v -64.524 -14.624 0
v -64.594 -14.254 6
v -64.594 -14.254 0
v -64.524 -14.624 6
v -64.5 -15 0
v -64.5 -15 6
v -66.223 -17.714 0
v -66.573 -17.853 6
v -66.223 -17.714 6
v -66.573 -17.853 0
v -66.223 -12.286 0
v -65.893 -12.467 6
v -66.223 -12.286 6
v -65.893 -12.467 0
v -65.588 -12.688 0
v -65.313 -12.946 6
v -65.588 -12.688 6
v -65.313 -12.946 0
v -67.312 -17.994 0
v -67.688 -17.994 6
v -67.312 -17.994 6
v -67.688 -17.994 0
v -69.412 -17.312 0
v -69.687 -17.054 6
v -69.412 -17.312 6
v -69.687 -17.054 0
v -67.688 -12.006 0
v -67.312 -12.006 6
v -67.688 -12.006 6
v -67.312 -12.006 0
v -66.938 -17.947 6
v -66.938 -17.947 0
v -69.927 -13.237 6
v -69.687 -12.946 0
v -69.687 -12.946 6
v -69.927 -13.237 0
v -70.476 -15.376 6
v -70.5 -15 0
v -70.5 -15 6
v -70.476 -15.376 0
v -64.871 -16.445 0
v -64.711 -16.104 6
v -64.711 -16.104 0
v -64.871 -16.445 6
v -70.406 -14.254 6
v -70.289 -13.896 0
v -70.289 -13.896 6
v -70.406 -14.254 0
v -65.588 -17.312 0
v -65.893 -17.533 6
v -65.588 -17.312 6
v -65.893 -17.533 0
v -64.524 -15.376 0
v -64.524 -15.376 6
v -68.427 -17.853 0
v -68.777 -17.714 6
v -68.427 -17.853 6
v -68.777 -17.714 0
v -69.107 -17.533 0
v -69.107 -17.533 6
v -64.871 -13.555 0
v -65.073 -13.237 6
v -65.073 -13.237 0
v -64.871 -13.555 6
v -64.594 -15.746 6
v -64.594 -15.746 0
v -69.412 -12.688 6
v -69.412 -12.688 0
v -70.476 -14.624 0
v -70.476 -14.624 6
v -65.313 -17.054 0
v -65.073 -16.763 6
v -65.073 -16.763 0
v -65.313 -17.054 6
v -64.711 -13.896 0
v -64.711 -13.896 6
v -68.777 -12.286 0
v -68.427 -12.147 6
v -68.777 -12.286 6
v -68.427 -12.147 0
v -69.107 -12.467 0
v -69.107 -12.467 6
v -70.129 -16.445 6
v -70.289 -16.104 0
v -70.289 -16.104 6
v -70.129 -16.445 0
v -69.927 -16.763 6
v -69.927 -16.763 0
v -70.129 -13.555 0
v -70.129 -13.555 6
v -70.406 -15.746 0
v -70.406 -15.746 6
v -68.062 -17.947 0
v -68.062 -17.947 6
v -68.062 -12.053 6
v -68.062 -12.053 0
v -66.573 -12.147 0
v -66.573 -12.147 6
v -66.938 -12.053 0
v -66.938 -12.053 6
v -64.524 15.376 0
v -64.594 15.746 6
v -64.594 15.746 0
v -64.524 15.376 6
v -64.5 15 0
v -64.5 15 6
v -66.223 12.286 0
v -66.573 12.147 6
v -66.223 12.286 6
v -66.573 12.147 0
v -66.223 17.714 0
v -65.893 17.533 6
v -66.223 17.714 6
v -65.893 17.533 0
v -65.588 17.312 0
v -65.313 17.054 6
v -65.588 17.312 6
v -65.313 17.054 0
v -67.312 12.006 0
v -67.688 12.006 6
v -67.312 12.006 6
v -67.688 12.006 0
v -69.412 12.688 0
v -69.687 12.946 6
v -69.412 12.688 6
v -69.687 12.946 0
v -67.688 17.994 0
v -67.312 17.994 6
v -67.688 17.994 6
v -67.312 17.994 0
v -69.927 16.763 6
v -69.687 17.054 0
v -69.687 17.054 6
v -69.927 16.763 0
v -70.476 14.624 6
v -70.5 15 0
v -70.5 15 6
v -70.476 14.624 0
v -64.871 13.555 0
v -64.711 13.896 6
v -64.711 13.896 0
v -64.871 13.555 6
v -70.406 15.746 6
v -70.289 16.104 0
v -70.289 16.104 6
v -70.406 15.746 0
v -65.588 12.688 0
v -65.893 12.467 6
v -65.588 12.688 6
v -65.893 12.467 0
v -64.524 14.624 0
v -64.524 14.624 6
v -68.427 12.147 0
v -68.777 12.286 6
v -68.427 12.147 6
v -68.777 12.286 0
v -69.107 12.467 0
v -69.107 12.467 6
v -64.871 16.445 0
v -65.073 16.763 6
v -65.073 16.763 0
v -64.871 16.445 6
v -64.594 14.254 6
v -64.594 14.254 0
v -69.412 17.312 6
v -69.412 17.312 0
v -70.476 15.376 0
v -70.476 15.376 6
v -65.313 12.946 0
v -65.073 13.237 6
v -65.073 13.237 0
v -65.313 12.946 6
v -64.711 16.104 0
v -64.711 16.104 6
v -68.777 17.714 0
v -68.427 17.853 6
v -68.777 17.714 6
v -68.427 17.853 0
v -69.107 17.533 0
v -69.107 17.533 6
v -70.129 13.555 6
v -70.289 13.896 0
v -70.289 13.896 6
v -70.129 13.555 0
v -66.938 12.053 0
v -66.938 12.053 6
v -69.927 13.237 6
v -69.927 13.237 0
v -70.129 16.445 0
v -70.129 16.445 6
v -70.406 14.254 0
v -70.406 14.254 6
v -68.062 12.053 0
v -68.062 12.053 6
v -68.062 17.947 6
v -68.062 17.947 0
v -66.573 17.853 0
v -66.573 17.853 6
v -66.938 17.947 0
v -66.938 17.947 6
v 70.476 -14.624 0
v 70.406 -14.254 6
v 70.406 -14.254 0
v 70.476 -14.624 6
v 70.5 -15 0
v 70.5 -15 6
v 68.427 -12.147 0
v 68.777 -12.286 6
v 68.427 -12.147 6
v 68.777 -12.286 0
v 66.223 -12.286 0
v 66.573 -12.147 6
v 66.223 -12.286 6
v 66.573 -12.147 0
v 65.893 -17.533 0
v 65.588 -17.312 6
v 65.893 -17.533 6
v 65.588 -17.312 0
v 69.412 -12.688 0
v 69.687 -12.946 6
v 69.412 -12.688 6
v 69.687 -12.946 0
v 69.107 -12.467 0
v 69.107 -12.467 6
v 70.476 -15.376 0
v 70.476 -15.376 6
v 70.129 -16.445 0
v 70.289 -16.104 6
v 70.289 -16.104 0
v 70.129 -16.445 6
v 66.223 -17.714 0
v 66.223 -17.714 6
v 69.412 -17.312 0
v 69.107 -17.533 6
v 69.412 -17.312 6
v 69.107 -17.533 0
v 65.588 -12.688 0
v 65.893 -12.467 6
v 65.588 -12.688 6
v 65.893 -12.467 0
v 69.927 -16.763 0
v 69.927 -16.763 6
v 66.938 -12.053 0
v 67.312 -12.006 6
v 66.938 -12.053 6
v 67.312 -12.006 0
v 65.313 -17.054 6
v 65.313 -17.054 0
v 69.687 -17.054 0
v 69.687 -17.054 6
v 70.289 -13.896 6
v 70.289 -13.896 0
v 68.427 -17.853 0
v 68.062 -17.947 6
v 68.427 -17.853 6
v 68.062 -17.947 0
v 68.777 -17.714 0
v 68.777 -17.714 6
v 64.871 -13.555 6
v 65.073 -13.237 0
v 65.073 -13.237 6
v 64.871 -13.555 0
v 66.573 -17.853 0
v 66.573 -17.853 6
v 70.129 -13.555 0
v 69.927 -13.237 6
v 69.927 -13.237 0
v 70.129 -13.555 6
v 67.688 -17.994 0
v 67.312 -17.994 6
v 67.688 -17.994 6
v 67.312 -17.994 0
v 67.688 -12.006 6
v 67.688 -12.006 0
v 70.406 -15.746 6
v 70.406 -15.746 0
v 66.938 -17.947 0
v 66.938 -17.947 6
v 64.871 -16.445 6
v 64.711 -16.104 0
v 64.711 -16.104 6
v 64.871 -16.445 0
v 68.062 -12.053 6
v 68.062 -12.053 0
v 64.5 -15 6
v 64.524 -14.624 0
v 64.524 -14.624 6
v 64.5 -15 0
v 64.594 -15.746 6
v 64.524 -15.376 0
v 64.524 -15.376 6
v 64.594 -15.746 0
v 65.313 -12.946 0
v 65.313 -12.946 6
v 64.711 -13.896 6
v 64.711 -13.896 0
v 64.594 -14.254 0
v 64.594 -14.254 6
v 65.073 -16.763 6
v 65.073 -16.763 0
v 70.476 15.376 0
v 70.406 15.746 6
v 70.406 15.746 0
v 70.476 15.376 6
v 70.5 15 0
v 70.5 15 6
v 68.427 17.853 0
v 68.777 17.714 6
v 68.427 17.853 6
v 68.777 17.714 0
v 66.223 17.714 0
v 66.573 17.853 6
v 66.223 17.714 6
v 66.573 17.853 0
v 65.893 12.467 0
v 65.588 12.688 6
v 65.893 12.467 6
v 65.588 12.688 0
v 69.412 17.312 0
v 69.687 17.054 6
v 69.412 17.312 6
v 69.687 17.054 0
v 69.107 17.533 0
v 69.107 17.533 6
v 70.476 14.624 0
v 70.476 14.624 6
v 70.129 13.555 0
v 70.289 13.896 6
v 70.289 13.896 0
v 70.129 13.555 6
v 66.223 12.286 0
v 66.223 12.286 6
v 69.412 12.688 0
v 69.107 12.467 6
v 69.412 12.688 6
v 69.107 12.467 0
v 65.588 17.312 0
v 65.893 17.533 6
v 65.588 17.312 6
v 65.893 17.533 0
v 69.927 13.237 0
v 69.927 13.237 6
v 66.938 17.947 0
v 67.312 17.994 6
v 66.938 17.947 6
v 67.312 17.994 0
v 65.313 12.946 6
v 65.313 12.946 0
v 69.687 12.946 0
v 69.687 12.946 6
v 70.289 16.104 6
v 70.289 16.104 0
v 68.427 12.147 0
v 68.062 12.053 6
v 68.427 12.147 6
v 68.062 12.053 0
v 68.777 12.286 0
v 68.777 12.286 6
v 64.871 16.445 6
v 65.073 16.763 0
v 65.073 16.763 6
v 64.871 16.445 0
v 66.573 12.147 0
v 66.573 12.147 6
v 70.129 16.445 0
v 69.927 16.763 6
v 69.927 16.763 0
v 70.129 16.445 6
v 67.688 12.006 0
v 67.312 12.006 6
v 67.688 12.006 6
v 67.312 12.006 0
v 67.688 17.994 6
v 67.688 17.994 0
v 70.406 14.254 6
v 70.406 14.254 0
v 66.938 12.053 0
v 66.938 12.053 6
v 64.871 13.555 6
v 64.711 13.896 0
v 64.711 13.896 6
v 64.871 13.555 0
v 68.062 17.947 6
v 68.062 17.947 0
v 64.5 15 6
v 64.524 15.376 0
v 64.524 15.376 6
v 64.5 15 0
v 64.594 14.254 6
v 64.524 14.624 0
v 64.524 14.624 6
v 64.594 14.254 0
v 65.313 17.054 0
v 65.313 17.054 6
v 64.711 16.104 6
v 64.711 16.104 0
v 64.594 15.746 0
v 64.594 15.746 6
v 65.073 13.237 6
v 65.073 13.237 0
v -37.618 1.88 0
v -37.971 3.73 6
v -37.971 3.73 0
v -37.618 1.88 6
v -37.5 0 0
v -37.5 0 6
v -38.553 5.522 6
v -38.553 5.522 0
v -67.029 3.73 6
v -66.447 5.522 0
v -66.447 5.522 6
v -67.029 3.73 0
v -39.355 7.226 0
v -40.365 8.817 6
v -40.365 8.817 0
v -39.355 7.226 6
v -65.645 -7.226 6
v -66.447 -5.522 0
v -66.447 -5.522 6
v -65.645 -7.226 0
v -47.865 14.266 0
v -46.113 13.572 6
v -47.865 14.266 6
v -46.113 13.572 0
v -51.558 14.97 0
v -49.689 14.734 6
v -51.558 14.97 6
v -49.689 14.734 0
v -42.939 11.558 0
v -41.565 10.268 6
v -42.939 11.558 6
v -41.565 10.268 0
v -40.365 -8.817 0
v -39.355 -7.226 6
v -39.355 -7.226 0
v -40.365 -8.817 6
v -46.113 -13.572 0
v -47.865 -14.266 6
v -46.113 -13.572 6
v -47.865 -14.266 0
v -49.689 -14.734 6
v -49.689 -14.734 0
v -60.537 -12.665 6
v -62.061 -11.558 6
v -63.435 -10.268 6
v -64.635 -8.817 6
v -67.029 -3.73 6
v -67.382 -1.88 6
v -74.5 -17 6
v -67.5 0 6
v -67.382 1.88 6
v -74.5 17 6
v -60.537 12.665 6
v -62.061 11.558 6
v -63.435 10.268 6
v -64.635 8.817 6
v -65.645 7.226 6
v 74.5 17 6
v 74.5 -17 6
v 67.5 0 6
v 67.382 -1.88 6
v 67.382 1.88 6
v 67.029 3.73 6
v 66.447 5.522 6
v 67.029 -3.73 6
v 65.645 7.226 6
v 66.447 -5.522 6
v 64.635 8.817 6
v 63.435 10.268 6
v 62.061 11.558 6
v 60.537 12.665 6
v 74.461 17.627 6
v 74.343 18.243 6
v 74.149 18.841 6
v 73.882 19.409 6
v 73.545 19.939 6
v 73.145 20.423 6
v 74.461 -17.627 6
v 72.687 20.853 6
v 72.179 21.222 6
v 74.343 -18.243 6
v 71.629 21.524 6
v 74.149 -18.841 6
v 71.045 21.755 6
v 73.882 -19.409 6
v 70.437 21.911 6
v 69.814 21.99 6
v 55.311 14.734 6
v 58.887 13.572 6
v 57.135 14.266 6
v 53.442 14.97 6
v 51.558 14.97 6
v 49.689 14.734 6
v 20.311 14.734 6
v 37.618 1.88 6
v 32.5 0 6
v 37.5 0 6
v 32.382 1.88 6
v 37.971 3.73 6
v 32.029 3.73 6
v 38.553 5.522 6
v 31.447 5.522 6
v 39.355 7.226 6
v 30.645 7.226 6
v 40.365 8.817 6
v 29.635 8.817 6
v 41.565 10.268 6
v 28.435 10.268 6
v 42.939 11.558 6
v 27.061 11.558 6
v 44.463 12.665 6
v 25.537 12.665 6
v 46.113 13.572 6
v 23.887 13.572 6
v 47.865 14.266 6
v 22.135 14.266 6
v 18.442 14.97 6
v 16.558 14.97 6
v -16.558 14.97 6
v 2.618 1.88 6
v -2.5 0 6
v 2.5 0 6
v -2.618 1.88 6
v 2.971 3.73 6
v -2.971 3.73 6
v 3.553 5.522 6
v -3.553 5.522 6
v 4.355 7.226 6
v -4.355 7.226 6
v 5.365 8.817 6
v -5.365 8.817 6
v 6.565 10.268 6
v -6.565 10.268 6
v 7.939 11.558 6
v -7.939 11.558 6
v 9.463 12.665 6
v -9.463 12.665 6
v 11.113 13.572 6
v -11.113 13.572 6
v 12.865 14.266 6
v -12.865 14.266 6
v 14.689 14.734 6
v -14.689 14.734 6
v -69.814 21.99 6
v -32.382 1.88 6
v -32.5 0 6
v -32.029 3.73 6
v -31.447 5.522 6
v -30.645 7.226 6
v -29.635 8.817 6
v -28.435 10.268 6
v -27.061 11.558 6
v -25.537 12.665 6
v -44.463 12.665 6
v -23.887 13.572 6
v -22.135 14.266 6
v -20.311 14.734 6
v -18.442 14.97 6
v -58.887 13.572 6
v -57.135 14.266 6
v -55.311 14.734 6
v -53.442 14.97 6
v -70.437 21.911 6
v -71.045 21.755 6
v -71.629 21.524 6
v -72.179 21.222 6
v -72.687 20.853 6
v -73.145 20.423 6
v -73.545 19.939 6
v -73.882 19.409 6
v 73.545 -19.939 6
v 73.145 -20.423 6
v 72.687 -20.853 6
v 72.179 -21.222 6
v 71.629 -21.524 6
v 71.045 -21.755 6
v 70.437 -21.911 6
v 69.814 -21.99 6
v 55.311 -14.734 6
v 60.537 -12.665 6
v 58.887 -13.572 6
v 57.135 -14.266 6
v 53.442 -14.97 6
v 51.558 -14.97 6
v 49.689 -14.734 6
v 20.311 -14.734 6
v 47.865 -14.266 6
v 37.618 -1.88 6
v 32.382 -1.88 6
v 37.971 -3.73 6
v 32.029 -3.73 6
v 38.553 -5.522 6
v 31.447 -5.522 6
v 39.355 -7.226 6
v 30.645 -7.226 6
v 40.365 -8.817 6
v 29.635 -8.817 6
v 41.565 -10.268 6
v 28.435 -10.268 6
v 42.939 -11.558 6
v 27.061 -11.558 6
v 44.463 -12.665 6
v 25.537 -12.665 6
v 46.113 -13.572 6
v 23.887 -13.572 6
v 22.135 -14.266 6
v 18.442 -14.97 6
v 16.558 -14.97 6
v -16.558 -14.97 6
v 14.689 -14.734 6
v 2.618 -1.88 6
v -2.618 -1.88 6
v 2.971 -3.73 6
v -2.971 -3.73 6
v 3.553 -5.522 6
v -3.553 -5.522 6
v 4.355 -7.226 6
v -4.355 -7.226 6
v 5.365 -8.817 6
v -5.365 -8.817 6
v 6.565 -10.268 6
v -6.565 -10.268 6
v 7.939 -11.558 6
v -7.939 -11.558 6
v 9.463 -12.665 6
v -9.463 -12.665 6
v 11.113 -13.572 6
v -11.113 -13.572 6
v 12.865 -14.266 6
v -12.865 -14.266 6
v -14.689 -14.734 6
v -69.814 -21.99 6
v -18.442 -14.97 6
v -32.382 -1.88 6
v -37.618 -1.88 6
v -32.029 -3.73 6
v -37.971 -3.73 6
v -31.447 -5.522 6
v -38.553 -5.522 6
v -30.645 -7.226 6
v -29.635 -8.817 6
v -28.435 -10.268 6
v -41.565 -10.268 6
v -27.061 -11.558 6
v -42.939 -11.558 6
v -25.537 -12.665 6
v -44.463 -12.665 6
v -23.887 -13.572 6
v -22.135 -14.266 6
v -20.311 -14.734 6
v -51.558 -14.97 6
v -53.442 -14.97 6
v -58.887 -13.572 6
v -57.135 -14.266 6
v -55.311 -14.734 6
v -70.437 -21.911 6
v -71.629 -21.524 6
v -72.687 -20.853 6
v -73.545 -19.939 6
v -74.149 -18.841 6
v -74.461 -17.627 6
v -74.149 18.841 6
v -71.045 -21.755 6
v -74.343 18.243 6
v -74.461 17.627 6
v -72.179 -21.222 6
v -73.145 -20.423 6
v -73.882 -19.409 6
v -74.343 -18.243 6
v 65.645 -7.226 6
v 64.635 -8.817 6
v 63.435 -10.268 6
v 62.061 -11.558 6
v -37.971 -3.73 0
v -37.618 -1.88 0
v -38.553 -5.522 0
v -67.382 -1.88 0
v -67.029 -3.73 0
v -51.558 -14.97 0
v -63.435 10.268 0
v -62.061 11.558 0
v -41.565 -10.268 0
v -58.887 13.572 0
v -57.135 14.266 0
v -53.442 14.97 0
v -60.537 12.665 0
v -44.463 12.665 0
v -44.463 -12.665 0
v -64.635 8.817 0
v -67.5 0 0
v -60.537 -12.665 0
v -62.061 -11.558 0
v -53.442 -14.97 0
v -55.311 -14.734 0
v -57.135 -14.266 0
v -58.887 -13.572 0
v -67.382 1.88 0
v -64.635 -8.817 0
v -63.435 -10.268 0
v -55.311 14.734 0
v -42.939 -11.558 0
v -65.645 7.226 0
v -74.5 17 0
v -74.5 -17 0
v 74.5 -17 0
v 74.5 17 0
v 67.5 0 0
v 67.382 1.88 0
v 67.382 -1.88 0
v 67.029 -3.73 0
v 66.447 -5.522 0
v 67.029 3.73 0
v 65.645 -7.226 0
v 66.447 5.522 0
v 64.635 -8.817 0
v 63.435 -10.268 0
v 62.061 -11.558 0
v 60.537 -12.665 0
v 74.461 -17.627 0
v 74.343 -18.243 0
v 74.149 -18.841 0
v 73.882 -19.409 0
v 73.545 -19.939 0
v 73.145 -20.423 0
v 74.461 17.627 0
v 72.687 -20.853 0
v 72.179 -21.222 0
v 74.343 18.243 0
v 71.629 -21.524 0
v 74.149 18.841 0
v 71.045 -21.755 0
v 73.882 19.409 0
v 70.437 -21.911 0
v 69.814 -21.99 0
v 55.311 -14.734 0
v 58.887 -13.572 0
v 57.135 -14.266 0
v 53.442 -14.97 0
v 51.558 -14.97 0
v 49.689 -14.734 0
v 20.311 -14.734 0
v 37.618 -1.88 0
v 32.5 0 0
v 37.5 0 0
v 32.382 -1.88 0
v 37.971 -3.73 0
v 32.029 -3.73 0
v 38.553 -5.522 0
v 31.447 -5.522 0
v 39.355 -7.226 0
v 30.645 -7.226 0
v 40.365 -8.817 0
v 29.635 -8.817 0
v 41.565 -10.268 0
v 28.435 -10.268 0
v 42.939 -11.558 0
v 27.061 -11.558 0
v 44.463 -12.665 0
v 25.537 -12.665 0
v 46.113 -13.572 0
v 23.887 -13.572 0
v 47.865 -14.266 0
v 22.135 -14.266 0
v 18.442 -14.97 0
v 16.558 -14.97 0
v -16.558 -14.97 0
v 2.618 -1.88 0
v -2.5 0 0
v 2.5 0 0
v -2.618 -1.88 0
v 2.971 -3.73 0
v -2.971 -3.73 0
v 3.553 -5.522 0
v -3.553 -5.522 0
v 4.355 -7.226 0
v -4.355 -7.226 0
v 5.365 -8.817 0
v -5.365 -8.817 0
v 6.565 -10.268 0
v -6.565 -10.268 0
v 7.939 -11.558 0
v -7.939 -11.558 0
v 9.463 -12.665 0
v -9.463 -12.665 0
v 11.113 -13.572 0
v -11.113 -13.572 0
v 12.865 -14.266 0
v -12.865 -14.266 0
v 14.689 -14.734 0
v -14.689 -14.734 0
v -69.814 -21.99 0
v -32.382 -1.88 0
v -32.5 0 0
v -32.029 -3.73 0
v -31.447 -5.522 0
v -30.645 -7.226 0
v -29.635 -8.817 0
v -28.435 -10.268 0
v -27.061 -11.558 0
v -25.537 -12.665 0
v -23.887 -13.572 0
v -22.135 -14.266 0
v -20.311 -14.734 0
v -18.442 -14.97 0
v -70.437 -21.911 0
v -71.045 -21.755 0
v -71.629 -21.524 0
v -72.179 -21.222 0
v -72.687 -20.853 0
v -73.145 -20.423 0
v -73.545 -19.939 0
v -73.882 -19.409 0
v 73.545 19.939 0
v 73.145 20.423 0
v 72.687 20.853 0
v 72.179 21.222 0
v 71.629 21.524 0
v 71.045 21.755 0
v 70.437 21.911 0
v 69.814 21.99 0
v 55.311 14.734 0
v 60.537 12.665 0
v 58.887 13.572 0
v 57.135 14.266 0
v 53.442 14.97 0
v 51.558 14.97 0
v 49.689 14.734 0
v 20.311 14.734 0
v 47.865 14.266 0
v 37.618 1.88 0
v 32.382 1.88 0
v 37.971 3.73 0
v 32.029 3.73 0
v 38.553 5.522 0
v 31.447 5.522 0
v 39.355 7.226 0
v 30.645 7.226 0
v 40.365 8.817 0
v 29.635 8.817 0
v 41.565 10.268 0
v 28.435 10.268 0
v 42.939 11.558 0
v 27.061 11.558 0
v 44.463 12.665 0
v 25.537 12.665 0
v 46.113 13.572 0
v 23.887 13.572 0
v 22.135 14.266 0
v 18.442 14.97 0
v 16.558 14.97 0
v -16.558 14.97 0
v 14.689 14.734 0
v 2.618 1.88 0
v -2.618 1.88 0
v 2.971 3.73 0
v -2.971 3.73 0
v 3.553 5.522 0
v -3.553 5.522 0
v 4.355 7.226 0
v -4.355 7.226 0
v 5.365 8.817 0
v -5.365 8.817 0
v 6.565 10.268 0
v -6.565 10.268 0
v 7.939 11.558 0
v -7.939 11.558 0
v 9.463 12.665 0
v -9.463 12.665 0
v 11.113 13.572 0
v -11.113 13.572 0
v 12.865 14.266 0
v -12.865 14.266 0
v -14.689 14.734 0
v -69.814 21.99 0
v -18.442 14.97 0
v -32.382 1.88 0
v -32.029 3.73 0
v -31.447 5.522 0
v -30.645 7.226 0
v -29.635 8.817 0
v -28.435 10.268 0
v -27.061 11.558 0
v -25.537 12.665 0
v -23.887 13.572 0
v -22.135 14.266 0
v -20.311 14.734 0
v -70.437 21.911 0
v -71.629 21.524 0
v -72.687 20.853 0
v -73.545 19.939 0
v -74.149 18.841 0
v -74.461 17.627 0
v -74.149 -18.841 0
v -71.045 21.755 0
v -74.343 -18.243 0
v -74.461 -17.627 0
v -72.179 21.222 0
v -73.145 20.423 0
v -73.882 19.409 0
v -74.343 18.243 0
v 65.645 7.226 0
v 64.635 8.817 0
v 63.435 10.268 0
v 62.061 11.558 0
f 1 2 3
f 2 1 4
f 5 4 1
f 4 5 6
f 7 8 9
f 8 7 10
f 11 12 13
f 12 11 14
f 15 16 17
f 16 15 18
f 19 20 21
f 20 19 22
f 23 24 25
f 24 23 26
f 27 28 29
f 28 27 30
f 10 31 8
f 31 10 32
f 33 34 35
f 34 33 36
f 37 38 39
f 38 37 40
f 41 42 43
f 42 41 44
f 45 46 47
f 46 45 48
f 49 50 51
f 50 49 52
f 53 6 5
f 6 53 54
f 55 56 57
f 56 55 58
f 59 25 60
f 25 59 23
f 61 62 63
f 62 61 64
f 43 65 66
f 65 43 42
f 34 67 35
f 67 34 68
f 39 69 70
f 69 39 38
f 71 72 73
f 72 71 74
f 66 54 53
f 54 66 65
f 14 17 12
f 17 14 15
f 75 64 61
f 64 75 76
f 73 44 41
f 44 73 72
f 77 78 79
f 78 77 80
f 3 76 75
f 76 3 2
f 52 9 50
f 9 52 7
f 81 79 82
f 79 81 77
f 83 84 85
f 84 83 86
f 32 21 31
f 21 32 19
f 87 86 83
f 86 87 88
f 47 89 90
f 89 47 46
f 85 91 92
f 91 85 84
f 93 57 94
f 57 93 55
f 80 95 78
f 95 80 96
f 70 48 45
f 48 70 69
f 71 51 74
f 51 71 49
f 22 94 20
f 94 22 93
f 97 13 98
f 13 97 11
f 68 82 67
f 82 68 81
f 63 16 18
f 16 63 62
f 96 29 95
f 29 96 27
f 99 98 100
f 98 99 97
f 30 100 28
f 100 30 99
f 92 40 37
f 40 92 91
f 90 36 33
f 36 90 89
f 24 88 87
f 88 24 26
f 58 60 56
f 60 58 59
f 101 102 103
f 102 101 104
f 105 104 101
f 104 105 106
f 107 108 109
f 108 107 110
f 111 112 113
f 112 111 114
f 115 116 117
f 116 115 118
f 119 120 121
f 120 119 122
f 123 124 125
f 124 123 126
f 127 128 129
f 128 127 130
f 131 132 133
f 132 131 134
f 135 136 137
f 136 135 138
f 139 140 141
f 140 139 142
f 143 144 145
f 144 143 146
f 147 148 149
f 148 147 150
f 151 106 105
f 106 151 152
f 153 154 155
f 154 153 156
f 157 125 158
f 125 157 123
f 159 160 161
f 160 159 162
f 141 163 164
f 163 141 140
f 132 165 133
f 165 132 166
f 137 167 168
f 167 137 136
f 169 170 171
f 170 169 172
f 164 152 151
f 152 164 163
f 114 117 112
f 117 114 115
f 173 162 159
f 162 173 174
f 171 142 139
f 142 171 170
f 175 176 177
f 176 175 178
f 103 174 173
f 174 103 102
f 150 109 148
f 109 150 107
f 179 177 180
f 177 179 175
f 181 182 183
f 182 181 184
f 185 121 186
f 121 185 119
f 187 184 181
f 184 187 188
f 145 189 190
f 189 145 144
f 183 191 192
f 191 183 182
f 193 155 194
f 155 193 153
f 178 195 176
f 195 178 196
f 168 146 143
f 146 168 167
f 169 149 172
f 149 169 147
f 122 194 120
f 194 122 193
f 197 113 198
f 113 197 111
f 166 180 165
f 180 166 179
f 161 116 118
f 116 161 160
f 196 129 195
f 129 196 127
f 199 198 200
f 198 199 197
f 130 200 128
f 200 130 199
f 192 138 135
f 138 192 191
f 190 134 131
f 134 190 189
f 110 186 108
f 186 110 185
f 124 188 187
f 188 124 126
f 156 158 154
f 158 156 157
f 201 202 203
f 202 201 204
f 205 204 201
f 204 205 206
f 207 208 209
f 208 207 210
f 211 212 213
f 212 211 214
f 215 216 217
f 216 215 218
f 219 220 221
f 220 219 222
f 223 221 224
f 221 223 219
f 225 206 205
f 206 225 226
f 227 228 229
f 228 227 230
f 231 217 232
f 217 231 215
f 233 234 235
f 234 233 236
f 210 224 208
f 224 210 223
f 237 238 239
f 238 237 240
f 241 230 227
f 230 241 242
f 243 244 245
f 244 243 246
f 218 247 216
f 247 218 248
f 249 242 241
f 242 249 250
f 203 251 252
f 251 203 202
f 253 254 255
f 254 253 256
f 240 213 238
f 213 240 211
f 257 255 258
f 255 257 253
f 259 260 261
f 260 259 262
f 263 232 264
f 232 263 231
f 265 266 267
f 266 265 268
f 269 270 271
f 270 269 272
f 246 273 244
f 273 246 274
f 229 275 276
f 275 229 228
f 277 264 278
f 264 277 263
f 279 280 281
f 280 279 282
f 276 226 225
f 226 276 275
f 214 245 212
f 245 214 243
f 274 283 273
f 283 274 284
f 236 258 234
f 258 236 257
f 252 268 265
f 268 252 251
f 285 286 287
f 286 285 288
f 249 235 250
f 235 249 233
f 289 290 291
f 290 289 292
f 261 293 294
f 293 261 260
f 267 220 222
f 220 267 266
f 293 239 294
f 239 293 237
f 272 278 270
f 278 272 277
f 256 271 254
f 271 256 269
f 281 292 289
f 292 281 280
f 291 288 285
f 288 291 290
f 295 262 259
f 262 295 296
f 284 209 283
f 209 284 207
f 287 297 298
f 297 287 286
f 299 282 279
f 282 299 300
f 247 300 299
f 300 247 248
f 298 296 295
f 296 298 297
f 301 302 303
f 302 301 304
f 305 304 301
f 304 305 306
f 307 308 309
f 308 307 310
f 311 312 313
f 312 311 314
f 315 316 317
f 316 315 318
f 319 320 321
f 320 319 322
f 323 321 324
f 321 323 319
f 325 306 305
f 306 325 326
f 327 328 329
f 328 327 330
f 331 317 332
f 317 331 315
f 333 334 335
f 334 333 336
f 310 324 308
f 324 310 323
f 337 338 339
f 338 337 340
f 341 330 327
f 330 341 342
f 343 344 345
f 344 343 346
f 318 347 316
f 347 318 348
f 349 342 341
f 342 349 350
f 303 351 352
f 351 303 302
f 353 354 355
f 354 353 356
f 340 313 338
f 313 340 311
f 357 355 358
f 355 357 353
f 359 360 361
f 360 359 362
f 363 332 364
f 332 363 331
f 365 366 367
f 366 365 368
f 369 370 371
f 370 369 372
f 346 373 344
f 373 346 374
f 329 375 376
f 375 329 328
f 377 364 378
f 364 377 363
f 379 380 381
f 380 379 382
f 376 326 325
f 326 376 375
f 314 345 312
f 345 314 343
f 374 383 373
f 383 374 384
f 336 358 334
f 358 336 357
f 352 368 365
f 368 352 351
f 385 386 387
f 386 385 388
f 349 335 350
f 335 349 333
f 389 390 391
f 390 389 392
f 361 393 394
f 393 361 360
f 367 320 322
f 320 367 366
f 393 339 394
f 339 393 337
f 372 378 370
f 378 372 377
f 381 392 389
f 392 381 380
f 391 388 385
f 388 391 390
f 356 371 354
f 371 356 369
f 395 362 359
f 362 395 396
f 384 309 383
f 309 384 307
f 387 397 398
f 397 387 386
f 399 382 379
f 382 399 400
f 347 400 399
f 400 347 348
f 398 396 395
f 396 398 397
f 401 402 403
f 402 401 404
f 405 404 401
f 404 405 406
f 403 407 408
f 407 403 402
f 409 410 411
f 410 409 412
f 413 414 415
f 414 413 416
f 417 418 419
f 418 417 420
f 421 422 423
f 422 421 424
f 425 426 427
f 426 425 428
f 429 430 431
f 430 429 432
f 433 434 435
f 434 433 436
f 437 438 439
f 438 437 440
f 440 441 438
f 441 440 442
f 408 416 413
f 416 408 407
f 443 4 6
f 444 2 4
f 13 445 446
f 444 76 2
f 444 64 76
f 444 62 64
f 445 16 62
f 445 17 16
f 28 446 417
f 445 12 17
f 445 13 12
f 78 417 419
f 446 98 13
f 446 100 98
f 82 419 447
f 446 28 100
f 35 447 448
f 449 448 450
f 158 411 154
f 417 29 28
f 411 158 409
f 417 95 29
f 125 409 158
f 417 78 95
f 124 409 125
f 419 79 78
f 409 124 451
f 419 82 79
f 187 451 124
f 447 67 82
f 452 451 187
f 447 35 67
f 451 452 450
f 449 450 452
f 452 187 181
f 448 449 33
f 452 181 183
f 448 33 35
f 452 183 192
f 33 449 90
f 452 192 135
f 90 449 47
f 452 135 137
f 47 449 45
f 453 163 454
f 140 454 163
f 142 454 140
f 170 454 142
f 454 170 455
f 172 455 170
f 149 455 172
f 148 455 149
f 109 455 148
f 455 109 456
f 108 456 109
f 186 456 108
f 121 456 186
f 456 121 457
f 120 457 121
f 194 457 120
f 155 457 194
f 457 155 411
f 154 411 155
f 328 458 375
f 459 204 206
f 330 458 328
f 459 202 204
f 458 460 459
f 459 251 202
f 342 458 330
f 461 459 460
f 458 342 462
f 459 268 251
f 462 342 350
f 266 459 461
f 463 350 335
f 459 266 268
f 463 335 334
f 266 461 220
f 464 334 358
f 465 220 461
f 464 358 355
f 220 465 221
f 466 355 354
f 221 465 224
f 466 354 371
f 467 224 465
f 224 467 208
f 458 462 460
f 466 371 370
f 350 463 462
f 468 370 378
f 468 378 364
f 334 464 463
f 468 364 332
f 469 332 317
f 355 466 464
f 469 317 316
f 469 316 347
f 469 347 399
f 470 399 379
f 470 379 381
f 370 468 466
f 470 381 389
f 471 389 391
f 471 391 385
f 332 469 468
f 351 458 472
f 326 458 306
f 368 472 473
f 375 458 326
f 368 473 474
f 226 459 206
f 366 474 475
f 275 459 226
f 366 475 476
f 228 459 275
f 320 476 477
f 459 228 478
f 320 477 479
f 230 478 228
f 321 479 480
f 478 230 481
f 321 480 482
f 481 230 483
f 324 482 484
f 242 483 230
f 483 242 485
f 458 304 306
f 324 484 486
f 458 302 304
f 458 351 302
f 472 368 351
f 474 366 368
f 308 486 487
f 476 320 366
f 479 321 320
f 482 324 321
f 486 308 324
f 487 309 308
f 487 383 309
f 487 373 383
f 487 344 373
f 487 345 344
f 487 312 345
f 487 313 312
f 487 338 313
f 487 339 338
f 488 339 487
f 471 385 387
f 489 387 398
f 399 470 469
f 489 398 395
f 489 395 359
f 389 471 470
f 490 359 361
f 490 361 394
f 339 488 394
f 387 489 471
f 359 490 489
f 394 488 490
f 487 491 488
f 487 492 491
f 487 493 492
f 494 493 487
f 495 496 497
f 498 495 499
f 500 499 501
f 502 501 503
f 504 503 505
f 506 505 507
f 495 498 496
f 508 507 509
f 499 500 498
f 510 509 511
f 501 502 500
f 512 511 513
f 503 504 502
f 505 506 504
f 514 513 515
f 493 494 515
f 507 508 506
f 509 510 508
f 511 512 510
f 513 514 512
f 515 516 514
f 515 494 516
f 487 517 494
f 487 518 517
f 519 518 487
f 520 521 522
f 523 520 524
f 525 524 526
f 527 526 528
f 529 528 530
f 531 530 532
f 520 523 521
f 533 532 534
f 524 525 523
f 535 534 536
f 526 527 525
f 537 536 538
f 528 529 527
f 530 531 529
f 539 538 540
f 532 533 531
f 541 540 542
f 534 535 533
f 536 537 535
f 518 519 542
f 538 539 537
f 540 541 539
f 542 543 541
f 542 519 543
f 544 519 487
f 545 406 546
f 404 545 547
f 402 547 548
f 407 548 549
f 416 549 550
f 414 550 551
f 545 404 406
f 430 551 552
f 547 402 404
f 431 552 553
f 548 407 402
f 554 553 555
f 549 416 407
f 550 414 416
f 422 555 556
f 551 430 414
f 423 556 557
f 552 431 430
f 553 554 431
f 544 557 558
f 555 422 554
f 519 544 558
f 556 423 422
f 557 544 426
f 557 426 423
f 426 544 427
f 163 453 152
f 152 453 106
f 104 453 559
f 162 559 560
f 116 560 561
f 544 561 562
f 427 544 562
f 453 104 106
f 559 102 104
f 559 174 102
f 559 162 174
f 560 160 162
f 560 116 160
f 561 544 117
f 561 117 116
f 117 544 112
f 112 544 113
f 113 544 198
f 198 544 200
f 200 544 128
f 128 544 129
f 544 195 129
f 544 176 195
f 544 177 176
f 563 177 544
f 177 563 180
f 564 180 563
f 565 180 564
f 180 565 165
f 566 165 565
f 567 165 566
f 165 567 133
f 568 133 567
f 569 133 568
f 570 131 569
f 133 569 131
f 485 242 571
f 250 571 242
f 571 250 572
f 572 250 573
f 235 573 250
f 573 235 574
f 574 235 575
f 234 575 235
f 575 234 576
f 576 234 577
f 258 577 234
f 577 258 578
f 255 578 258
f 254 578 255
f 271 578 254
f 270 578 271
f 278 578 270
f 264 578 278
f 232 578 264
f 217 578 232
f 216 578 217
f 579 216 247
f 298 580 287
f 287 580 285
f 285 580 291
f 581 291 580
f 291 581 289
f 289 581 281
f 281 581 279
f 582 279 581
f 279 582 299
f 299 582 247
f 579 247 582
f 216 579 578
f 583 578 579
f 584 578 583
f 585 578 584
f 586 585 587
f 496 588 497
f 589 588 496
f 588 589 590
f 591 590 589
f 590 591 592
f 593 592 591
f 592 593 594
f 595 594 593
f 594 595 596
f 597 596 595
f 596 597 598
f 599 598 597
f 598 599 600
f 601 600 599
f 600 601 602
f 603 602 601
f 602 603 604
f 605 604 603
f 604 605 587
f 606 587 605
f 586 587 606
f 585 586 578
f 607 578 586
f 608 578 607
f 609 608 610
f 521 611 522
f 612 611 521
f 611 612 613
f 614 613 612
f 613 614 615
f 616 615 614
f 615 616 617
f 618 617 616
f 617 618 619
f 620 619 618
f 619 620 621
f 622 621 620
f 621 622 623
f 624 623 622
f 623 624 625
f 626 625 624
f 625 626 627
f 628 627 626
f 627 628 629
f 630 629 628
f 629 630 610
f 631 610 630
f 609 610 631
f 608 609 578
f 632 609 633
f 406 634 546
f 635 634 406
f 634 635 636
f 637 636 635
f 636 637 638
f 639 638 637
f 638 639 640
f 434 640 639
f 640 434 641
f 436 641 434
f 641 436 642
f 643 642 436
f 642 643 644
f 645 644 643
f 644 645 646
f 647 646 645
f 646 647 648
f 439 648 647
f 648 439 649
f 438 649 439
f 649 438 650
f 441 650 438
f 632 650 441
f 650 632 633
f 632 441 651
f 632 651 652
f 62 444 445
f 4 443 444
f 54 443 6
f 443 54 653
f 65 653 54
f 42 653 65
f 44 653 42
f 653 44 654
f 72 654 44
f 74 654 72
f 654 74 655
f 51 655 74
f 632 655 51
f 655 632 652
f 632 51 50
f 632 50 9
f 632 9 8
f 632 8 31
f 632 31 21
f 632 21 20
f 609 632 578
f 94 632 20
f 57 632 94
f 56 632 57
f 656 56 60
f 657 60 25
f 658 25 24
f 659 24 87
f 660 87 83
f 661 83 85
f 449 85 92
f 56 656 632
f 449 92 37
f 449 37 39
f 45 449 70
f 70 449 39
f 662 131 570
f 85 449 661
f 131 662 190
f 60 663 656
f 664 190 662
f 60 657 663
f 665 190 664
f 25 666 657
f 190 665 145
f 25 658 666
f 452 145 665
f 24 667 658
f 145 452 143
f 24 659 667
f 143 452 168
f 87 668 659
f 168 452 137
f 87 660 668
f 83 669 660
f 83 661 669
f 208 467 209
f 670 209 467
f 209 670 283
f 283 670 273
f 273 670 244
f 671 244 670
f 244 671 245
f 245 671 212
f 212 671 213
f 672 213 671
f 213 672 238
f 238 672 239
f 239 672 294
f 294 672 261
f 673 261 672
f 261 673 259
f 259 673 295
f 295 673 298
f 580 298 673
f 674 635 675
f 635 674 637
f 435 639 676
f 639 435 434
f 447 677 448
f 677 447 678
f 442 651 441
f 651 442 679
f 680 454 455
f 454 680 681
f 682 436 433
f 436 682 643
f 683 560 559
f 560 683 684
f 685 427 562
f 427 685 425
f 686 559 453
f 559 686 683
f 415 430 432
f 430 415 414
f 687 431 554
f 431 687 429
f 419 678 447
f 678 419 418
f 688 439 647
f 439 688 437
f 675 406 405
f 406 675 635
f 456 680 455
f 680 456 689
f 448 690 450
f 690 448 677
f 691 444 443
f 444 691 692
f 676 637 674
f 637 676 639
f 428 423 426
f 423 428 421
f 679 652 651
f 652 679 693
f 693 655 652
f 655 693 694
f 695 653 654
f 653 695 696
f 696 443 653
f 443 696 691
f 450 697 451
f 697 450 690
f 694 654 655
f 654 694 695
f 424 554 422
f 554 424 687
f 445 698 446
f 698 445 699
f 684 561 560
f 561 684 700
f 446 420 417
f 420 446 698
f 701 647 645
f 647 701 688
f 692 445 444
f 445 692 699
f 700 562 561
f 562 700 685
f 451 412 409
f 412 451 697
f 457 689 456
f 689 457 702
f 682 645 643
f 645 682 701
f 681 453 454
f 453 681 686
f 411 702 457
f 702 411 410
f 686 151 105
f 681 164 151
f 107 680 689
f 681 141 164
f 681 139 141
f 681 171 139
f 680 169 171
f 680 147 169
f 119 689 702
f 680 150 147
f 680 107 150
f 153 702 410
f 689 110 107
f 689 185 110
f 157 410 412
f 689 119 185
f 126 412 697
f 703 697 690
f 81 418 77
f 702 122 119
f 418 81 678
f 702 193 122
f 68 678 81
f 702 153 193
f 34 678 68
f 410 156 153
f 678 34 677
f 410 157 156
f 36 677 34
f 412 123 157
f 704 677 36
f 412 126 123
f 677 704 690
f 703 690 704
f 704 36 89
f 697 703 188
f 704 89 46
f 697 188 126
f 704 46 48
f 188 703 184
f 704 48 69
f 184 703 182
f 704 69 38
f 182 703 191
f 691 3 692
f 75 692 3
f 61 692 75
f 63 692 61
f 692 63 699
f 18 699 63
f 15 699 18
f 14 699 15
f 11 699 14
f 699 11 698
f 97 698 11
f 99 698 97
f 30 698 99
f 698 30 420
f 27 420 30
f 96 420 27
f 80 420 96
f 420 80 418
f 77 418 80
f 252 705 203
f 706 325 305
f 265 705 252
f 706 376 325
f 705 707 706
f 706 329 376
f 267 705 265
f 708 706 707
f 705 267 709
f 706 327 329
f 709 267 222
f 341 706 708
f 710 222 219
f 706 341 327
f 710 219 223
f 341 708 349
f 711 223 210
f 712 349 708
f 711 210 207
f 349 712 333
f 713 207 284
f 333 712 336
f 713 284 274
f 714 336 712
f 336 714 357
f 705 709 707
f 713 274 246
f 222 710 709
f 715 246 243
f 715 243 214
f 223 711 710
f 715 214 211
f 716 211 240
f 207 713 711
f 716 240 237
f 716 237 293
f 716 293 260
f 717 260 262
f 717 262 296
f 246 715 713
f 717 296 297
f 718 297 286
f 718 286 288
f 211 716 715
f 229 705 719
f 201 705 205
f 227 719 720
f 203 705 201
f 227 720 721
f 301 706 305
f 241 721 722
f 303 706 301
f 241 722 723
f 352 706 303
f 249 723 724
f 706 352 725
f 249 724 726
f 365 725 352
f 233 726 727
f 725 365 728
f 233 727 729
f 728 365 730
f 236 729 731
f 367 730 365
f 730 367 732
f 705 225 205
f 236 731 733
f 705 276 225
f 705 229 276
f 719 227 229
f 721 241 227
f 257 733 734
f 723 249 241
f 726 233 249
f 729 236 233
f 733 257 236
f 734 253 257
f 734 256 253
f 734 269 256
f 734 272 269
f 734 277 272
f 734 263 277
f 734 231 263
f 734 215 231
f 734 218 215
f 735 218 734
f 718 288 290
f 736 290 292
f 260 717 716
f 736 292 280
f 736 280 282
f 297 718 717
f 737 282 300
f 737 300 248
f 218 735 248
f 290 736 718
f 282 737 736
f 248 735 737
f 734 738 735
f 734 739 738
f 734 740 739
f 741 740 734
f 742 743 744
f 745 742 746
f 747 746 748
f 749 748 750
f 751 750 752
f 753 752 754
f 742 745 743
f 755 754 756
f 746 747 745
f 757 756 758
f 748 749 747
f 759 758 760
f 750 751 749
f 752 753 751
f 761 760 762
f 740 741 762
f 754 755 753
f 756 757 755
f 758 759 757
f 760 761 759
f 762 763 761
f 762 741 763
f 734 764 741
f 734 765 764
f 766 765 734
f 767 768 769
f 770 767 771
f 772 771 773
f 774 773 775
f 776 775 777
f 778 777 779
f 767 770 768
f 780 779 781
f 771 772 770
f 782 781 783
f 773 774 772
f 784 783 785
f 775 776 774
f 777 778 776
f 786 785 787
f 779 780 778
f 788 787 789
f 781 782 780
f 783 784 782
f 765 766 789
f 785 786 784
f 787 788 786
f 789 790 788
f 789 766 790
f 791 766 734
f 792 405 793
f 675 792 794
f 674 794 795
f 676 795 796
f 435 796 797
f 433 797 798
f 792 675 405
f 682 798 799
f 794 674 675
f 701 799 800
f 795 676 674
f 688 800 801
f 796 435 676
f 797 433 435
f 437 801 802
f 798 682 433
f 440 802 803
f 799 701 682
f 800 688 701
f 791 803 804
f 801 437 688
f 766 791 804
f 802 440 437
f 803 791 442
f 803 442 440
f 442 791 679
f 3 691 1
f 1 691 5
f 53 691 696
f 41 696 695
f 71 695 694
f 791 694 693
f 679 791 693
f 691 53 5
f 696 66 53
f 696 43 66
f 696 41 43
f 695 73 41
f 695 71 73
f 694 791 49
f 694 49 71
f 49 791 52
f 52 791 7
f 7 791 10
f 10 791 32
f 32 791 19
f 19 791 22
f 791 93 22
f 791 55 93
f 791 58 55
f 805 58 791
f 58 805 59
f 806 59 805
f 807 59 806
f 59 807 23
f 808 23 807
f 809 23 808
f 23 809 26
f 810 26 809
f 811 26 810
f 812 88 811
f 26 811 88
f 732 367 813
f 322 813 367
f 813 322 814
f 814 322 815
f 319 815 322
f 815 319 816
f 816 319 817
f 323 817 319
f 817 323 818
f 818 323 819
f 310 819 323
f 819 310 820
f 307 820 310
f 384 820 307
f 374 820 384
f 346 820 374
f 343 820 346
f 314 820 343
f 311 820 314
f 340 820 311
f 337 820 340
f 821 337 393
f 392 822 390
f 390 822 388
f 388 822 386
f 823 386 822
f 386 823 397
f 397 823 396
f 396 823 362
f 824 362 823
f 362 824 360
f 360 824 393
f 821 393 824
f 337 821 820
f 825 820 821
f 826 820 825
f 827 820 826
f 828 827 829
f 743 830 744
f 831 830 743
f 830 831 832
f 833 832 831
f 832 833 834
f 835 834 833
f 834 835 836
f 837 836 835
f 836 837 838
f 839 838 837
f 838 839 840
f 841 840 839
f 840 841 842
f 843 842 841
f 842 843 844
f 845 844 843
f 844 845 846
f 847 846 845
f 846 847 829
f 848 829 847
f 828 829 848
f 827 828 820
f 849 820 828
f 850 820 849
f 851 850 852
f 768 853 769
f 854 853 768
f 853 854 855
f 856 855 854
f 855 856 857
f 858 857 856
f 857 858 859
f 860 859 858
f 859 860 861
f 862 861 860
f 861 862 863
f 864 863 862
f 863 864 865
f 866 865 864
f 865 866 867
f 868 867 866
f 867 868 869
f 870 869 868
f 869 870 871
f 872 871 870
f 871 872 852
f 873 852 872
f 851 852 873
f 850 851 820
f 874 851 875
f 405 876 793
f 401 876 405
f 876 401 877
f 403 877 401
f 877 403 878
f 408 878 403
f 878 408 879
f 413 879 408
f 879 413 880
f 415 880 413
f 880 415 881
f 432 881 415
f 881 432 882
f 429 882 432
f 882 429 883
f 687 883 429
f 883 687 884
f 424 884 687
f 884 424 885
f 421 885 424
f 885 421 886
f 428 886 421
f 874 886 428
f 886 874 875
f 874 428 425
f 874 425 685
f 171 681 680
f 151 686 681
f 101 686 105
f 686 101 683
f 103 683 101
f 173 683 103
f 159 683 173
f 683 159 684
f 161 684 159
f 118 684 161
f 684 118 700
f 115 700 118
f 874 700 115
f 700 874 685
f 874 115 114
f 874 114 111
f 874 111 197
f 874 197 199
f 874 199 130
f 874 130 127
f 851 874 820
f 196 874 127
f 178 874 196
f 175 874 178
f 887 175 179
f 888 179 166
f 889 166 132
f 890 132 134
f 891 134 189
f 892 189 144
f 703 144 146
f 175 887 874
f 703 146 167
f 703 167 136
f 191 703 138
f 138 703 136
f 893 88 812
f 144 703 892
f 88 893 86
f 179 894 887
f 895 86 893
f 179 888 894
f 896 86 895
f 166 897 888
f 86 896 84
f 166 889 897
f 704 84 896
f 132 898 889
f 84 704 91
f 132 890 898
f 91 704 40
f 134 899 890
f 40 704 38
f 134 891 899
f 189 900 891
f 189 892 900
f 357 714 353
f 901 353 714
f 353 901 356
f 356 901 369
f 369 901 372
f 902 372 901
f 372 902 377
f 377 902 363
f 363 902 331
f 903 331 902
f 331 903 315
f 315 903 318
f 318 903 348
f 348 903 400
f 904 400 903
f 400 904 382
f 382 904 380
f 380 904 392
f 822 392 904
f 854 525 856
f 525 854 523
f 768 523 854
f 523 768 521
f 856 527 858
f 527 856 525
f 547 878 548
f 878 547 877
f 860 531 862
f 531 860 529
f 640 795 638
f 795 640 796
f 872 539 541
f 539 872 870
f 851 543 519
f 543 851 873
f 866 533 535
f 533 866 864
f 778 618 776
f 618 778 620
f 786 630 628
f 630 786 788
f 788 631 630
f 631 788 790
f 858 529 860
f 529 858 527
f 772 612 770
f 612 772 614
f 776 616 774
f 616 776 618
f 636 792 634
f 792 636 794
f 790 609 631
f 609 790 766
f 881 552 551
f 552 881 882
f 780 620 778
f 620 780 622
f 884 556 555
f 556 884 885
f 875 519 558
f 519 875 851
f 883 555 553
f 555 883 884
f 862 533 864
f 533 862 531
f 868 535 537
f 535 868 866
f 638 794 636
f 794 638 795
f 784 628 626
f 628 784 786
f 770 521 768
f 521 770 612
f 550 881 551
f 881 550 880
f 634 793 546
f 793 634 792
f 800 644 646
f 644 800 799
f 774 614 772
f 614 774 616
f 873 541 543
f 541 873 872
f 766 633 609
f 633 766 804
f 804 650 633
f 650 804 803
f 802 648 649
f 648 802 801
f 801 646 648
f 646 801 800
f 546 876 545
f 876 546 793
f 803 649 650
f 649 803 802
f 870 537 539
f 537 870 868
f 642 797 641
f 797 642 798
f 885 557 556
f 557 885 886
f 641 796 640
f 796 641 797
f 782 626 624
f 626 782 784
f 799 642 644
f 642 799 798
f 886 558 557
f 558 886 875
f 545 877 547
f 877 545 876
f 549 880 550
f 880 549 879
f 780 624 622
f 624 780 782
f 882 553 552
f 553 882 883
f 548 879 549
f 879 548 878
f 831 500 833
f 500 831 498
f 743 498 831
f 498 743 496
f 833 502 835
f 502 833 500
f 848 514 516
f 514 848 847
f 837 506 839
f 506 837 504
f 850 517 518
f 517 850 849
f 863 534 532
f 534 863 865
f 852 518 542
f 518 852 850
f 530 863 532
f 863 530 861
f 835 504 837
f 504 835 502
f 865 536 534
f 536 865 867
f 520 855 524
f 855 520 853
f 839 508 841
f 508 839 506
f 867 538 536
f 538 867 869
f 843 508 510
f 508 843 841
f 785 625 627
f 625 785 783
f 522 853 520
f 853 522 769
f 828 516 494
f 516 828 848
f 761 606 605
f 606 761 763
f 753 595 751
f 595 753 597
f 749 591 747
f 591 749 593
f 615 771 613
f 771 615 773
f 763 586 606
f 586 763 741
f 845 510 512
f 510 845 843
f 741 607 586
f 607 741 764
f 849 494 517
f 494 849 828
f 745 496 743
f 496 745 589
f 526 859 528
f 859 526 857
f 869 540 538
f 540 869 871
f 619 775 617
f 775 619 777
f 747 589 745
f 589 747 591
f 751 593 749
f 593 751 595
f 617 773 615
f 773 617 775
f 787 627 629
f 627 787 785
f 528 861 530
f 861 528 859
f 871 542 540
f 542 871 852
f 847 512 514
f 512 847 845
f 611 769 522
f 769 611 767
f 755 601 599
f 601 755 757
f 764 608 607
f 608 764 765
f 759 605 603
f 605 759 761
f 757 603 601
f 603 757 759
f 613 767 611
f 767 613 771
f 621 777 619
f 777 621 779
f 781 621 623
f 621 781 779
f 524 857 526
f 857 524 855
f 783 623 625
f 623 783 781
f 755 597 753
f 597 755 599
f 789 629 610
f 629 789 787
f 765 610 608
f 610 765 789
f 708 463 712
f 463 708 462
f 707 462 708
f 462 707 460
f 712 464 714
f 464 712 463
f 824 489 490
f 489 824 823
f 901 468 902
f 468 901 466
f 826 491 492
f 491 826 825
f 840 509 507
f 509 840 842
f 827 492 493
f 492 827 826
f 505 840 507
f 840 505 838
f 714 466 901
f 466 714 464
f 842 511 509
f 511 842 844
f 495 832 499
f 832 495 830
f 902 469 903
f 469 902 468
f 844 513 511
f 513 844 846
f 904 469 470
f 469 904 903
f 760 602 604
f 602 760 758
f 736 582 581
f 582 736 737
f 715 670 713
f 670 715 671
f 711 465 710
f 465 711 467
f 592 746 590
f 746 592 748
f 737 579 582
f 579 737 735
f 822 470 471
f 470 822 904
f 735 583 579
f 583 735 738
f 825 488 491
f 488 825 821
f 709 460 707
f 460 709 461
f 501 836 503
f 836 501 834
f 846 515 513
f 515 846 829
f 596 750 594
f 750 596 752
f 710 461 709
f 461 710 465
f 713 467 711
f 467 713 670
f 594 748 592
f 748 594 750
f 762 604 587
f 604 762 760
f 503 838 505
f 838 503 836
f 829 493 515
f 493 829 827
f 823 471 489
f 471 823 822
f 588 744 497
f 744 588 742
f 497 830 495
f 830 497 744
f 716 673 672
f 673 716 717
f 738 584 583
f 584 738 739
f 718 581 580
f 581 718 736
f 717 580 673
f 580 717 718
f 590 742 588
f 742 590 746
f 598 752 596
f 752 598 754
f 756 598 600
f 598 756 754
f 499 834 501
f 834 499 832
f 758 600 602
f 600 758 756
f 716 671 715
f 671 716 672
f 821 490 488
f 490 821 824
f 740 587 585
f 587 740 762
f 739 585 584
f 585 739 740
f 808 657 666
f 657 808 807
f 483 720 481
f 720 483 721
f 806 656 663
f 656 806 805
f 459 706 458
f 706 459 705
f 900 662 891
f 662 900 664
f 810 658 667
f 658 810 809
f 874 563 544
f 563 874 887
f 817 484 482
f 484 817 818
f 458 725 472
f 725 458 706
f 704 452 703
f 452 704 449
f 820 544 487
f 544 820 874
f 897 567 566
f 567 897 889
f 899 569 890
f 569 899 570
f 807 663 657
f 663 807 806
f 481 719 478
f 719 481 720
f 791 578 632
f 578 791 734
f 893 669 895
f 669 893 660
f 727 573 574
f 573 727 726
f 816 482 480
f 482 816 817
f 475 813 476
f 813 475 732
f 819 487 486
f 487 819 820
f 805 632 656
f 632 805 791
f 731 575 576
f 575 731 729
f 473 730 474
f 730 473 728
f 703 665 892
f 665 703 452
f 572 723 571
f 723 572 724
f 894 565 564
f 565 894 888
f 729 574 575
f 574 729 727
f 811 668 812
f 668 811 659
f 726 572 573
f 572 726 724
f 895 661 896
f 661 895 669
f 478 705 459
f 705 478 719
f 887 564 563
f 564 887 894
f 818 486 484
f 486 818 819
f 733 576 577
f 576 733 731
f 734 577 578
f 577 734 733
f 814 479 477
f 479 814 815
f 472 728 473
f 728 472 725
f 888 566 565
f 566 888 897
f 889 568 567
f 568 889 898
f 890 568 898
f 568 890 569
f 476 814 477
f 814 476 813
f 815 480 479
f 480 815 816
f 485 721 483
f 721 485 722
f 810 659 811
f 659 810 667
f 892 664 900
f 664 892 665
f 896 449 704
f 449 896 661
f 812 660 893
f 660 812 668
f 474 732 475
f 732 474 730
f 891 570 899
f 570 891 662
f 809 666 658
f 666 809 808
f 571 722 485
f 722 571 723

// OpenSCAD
$fn = 50;


difference() {
	union() {
		hull() {
			translate(v = [-69.5000000000, 17.0000000000, 0]) {
				cylinder(h = 6, r = 5);
			}
			translate(v = [69.5000000000, 17.0000000000, 0]) {
				cylinder(h = 6, r = 5);
			}
			translate(v = [-69.5000000000, -17.0000000000, 0]) {
				cylinder(h = 6, r = 5);
			}
			translate(v = [69.5000000000, -17.0000000000, 0]) {
				cylinder(h = 6, r = 5);
			}
		}
	}
	union() {
		#translate(v = [-67.5000000000, -15.0000000000, -100.0000000000]) {
			cylinder(h = 200, r = 3.0000000000);
		}
		#translate(v = [-67.5000000000, 15.0000000000, -100.0000000000]) {
			cylinder(h = 200, r = 3.0000000000);
		}
		#translate(v = [67.5000000000, -15.0000000000, -100.0000000000]) {
			cylinder(h = 200, r = 3.0000000000);
		}
		#translate(v = [67.5000000000, 15.0000000000, -100.0000000000]) {
			cylinder(h = 200, r = 3.0000000000);
		}
		#translate(v = [-52.5000000000, 0, 0]) {
			cylinder(h = 6, r = 15.0000000000);
		}
		#translate(v = [-17.5000000000, 0, 0]) {
			cylinder(h = 6, r = 15.0000000000);
		}
		#translate(v = [17.5000000000, 0, 0]) {
			cylinder(h = 6, r = 15.0000000000);
		}
		#translate(v = [52.5000000000, 0, 0]) {
			cylinder(h = 6, r = 15.0000000000);
		}
	}
}
